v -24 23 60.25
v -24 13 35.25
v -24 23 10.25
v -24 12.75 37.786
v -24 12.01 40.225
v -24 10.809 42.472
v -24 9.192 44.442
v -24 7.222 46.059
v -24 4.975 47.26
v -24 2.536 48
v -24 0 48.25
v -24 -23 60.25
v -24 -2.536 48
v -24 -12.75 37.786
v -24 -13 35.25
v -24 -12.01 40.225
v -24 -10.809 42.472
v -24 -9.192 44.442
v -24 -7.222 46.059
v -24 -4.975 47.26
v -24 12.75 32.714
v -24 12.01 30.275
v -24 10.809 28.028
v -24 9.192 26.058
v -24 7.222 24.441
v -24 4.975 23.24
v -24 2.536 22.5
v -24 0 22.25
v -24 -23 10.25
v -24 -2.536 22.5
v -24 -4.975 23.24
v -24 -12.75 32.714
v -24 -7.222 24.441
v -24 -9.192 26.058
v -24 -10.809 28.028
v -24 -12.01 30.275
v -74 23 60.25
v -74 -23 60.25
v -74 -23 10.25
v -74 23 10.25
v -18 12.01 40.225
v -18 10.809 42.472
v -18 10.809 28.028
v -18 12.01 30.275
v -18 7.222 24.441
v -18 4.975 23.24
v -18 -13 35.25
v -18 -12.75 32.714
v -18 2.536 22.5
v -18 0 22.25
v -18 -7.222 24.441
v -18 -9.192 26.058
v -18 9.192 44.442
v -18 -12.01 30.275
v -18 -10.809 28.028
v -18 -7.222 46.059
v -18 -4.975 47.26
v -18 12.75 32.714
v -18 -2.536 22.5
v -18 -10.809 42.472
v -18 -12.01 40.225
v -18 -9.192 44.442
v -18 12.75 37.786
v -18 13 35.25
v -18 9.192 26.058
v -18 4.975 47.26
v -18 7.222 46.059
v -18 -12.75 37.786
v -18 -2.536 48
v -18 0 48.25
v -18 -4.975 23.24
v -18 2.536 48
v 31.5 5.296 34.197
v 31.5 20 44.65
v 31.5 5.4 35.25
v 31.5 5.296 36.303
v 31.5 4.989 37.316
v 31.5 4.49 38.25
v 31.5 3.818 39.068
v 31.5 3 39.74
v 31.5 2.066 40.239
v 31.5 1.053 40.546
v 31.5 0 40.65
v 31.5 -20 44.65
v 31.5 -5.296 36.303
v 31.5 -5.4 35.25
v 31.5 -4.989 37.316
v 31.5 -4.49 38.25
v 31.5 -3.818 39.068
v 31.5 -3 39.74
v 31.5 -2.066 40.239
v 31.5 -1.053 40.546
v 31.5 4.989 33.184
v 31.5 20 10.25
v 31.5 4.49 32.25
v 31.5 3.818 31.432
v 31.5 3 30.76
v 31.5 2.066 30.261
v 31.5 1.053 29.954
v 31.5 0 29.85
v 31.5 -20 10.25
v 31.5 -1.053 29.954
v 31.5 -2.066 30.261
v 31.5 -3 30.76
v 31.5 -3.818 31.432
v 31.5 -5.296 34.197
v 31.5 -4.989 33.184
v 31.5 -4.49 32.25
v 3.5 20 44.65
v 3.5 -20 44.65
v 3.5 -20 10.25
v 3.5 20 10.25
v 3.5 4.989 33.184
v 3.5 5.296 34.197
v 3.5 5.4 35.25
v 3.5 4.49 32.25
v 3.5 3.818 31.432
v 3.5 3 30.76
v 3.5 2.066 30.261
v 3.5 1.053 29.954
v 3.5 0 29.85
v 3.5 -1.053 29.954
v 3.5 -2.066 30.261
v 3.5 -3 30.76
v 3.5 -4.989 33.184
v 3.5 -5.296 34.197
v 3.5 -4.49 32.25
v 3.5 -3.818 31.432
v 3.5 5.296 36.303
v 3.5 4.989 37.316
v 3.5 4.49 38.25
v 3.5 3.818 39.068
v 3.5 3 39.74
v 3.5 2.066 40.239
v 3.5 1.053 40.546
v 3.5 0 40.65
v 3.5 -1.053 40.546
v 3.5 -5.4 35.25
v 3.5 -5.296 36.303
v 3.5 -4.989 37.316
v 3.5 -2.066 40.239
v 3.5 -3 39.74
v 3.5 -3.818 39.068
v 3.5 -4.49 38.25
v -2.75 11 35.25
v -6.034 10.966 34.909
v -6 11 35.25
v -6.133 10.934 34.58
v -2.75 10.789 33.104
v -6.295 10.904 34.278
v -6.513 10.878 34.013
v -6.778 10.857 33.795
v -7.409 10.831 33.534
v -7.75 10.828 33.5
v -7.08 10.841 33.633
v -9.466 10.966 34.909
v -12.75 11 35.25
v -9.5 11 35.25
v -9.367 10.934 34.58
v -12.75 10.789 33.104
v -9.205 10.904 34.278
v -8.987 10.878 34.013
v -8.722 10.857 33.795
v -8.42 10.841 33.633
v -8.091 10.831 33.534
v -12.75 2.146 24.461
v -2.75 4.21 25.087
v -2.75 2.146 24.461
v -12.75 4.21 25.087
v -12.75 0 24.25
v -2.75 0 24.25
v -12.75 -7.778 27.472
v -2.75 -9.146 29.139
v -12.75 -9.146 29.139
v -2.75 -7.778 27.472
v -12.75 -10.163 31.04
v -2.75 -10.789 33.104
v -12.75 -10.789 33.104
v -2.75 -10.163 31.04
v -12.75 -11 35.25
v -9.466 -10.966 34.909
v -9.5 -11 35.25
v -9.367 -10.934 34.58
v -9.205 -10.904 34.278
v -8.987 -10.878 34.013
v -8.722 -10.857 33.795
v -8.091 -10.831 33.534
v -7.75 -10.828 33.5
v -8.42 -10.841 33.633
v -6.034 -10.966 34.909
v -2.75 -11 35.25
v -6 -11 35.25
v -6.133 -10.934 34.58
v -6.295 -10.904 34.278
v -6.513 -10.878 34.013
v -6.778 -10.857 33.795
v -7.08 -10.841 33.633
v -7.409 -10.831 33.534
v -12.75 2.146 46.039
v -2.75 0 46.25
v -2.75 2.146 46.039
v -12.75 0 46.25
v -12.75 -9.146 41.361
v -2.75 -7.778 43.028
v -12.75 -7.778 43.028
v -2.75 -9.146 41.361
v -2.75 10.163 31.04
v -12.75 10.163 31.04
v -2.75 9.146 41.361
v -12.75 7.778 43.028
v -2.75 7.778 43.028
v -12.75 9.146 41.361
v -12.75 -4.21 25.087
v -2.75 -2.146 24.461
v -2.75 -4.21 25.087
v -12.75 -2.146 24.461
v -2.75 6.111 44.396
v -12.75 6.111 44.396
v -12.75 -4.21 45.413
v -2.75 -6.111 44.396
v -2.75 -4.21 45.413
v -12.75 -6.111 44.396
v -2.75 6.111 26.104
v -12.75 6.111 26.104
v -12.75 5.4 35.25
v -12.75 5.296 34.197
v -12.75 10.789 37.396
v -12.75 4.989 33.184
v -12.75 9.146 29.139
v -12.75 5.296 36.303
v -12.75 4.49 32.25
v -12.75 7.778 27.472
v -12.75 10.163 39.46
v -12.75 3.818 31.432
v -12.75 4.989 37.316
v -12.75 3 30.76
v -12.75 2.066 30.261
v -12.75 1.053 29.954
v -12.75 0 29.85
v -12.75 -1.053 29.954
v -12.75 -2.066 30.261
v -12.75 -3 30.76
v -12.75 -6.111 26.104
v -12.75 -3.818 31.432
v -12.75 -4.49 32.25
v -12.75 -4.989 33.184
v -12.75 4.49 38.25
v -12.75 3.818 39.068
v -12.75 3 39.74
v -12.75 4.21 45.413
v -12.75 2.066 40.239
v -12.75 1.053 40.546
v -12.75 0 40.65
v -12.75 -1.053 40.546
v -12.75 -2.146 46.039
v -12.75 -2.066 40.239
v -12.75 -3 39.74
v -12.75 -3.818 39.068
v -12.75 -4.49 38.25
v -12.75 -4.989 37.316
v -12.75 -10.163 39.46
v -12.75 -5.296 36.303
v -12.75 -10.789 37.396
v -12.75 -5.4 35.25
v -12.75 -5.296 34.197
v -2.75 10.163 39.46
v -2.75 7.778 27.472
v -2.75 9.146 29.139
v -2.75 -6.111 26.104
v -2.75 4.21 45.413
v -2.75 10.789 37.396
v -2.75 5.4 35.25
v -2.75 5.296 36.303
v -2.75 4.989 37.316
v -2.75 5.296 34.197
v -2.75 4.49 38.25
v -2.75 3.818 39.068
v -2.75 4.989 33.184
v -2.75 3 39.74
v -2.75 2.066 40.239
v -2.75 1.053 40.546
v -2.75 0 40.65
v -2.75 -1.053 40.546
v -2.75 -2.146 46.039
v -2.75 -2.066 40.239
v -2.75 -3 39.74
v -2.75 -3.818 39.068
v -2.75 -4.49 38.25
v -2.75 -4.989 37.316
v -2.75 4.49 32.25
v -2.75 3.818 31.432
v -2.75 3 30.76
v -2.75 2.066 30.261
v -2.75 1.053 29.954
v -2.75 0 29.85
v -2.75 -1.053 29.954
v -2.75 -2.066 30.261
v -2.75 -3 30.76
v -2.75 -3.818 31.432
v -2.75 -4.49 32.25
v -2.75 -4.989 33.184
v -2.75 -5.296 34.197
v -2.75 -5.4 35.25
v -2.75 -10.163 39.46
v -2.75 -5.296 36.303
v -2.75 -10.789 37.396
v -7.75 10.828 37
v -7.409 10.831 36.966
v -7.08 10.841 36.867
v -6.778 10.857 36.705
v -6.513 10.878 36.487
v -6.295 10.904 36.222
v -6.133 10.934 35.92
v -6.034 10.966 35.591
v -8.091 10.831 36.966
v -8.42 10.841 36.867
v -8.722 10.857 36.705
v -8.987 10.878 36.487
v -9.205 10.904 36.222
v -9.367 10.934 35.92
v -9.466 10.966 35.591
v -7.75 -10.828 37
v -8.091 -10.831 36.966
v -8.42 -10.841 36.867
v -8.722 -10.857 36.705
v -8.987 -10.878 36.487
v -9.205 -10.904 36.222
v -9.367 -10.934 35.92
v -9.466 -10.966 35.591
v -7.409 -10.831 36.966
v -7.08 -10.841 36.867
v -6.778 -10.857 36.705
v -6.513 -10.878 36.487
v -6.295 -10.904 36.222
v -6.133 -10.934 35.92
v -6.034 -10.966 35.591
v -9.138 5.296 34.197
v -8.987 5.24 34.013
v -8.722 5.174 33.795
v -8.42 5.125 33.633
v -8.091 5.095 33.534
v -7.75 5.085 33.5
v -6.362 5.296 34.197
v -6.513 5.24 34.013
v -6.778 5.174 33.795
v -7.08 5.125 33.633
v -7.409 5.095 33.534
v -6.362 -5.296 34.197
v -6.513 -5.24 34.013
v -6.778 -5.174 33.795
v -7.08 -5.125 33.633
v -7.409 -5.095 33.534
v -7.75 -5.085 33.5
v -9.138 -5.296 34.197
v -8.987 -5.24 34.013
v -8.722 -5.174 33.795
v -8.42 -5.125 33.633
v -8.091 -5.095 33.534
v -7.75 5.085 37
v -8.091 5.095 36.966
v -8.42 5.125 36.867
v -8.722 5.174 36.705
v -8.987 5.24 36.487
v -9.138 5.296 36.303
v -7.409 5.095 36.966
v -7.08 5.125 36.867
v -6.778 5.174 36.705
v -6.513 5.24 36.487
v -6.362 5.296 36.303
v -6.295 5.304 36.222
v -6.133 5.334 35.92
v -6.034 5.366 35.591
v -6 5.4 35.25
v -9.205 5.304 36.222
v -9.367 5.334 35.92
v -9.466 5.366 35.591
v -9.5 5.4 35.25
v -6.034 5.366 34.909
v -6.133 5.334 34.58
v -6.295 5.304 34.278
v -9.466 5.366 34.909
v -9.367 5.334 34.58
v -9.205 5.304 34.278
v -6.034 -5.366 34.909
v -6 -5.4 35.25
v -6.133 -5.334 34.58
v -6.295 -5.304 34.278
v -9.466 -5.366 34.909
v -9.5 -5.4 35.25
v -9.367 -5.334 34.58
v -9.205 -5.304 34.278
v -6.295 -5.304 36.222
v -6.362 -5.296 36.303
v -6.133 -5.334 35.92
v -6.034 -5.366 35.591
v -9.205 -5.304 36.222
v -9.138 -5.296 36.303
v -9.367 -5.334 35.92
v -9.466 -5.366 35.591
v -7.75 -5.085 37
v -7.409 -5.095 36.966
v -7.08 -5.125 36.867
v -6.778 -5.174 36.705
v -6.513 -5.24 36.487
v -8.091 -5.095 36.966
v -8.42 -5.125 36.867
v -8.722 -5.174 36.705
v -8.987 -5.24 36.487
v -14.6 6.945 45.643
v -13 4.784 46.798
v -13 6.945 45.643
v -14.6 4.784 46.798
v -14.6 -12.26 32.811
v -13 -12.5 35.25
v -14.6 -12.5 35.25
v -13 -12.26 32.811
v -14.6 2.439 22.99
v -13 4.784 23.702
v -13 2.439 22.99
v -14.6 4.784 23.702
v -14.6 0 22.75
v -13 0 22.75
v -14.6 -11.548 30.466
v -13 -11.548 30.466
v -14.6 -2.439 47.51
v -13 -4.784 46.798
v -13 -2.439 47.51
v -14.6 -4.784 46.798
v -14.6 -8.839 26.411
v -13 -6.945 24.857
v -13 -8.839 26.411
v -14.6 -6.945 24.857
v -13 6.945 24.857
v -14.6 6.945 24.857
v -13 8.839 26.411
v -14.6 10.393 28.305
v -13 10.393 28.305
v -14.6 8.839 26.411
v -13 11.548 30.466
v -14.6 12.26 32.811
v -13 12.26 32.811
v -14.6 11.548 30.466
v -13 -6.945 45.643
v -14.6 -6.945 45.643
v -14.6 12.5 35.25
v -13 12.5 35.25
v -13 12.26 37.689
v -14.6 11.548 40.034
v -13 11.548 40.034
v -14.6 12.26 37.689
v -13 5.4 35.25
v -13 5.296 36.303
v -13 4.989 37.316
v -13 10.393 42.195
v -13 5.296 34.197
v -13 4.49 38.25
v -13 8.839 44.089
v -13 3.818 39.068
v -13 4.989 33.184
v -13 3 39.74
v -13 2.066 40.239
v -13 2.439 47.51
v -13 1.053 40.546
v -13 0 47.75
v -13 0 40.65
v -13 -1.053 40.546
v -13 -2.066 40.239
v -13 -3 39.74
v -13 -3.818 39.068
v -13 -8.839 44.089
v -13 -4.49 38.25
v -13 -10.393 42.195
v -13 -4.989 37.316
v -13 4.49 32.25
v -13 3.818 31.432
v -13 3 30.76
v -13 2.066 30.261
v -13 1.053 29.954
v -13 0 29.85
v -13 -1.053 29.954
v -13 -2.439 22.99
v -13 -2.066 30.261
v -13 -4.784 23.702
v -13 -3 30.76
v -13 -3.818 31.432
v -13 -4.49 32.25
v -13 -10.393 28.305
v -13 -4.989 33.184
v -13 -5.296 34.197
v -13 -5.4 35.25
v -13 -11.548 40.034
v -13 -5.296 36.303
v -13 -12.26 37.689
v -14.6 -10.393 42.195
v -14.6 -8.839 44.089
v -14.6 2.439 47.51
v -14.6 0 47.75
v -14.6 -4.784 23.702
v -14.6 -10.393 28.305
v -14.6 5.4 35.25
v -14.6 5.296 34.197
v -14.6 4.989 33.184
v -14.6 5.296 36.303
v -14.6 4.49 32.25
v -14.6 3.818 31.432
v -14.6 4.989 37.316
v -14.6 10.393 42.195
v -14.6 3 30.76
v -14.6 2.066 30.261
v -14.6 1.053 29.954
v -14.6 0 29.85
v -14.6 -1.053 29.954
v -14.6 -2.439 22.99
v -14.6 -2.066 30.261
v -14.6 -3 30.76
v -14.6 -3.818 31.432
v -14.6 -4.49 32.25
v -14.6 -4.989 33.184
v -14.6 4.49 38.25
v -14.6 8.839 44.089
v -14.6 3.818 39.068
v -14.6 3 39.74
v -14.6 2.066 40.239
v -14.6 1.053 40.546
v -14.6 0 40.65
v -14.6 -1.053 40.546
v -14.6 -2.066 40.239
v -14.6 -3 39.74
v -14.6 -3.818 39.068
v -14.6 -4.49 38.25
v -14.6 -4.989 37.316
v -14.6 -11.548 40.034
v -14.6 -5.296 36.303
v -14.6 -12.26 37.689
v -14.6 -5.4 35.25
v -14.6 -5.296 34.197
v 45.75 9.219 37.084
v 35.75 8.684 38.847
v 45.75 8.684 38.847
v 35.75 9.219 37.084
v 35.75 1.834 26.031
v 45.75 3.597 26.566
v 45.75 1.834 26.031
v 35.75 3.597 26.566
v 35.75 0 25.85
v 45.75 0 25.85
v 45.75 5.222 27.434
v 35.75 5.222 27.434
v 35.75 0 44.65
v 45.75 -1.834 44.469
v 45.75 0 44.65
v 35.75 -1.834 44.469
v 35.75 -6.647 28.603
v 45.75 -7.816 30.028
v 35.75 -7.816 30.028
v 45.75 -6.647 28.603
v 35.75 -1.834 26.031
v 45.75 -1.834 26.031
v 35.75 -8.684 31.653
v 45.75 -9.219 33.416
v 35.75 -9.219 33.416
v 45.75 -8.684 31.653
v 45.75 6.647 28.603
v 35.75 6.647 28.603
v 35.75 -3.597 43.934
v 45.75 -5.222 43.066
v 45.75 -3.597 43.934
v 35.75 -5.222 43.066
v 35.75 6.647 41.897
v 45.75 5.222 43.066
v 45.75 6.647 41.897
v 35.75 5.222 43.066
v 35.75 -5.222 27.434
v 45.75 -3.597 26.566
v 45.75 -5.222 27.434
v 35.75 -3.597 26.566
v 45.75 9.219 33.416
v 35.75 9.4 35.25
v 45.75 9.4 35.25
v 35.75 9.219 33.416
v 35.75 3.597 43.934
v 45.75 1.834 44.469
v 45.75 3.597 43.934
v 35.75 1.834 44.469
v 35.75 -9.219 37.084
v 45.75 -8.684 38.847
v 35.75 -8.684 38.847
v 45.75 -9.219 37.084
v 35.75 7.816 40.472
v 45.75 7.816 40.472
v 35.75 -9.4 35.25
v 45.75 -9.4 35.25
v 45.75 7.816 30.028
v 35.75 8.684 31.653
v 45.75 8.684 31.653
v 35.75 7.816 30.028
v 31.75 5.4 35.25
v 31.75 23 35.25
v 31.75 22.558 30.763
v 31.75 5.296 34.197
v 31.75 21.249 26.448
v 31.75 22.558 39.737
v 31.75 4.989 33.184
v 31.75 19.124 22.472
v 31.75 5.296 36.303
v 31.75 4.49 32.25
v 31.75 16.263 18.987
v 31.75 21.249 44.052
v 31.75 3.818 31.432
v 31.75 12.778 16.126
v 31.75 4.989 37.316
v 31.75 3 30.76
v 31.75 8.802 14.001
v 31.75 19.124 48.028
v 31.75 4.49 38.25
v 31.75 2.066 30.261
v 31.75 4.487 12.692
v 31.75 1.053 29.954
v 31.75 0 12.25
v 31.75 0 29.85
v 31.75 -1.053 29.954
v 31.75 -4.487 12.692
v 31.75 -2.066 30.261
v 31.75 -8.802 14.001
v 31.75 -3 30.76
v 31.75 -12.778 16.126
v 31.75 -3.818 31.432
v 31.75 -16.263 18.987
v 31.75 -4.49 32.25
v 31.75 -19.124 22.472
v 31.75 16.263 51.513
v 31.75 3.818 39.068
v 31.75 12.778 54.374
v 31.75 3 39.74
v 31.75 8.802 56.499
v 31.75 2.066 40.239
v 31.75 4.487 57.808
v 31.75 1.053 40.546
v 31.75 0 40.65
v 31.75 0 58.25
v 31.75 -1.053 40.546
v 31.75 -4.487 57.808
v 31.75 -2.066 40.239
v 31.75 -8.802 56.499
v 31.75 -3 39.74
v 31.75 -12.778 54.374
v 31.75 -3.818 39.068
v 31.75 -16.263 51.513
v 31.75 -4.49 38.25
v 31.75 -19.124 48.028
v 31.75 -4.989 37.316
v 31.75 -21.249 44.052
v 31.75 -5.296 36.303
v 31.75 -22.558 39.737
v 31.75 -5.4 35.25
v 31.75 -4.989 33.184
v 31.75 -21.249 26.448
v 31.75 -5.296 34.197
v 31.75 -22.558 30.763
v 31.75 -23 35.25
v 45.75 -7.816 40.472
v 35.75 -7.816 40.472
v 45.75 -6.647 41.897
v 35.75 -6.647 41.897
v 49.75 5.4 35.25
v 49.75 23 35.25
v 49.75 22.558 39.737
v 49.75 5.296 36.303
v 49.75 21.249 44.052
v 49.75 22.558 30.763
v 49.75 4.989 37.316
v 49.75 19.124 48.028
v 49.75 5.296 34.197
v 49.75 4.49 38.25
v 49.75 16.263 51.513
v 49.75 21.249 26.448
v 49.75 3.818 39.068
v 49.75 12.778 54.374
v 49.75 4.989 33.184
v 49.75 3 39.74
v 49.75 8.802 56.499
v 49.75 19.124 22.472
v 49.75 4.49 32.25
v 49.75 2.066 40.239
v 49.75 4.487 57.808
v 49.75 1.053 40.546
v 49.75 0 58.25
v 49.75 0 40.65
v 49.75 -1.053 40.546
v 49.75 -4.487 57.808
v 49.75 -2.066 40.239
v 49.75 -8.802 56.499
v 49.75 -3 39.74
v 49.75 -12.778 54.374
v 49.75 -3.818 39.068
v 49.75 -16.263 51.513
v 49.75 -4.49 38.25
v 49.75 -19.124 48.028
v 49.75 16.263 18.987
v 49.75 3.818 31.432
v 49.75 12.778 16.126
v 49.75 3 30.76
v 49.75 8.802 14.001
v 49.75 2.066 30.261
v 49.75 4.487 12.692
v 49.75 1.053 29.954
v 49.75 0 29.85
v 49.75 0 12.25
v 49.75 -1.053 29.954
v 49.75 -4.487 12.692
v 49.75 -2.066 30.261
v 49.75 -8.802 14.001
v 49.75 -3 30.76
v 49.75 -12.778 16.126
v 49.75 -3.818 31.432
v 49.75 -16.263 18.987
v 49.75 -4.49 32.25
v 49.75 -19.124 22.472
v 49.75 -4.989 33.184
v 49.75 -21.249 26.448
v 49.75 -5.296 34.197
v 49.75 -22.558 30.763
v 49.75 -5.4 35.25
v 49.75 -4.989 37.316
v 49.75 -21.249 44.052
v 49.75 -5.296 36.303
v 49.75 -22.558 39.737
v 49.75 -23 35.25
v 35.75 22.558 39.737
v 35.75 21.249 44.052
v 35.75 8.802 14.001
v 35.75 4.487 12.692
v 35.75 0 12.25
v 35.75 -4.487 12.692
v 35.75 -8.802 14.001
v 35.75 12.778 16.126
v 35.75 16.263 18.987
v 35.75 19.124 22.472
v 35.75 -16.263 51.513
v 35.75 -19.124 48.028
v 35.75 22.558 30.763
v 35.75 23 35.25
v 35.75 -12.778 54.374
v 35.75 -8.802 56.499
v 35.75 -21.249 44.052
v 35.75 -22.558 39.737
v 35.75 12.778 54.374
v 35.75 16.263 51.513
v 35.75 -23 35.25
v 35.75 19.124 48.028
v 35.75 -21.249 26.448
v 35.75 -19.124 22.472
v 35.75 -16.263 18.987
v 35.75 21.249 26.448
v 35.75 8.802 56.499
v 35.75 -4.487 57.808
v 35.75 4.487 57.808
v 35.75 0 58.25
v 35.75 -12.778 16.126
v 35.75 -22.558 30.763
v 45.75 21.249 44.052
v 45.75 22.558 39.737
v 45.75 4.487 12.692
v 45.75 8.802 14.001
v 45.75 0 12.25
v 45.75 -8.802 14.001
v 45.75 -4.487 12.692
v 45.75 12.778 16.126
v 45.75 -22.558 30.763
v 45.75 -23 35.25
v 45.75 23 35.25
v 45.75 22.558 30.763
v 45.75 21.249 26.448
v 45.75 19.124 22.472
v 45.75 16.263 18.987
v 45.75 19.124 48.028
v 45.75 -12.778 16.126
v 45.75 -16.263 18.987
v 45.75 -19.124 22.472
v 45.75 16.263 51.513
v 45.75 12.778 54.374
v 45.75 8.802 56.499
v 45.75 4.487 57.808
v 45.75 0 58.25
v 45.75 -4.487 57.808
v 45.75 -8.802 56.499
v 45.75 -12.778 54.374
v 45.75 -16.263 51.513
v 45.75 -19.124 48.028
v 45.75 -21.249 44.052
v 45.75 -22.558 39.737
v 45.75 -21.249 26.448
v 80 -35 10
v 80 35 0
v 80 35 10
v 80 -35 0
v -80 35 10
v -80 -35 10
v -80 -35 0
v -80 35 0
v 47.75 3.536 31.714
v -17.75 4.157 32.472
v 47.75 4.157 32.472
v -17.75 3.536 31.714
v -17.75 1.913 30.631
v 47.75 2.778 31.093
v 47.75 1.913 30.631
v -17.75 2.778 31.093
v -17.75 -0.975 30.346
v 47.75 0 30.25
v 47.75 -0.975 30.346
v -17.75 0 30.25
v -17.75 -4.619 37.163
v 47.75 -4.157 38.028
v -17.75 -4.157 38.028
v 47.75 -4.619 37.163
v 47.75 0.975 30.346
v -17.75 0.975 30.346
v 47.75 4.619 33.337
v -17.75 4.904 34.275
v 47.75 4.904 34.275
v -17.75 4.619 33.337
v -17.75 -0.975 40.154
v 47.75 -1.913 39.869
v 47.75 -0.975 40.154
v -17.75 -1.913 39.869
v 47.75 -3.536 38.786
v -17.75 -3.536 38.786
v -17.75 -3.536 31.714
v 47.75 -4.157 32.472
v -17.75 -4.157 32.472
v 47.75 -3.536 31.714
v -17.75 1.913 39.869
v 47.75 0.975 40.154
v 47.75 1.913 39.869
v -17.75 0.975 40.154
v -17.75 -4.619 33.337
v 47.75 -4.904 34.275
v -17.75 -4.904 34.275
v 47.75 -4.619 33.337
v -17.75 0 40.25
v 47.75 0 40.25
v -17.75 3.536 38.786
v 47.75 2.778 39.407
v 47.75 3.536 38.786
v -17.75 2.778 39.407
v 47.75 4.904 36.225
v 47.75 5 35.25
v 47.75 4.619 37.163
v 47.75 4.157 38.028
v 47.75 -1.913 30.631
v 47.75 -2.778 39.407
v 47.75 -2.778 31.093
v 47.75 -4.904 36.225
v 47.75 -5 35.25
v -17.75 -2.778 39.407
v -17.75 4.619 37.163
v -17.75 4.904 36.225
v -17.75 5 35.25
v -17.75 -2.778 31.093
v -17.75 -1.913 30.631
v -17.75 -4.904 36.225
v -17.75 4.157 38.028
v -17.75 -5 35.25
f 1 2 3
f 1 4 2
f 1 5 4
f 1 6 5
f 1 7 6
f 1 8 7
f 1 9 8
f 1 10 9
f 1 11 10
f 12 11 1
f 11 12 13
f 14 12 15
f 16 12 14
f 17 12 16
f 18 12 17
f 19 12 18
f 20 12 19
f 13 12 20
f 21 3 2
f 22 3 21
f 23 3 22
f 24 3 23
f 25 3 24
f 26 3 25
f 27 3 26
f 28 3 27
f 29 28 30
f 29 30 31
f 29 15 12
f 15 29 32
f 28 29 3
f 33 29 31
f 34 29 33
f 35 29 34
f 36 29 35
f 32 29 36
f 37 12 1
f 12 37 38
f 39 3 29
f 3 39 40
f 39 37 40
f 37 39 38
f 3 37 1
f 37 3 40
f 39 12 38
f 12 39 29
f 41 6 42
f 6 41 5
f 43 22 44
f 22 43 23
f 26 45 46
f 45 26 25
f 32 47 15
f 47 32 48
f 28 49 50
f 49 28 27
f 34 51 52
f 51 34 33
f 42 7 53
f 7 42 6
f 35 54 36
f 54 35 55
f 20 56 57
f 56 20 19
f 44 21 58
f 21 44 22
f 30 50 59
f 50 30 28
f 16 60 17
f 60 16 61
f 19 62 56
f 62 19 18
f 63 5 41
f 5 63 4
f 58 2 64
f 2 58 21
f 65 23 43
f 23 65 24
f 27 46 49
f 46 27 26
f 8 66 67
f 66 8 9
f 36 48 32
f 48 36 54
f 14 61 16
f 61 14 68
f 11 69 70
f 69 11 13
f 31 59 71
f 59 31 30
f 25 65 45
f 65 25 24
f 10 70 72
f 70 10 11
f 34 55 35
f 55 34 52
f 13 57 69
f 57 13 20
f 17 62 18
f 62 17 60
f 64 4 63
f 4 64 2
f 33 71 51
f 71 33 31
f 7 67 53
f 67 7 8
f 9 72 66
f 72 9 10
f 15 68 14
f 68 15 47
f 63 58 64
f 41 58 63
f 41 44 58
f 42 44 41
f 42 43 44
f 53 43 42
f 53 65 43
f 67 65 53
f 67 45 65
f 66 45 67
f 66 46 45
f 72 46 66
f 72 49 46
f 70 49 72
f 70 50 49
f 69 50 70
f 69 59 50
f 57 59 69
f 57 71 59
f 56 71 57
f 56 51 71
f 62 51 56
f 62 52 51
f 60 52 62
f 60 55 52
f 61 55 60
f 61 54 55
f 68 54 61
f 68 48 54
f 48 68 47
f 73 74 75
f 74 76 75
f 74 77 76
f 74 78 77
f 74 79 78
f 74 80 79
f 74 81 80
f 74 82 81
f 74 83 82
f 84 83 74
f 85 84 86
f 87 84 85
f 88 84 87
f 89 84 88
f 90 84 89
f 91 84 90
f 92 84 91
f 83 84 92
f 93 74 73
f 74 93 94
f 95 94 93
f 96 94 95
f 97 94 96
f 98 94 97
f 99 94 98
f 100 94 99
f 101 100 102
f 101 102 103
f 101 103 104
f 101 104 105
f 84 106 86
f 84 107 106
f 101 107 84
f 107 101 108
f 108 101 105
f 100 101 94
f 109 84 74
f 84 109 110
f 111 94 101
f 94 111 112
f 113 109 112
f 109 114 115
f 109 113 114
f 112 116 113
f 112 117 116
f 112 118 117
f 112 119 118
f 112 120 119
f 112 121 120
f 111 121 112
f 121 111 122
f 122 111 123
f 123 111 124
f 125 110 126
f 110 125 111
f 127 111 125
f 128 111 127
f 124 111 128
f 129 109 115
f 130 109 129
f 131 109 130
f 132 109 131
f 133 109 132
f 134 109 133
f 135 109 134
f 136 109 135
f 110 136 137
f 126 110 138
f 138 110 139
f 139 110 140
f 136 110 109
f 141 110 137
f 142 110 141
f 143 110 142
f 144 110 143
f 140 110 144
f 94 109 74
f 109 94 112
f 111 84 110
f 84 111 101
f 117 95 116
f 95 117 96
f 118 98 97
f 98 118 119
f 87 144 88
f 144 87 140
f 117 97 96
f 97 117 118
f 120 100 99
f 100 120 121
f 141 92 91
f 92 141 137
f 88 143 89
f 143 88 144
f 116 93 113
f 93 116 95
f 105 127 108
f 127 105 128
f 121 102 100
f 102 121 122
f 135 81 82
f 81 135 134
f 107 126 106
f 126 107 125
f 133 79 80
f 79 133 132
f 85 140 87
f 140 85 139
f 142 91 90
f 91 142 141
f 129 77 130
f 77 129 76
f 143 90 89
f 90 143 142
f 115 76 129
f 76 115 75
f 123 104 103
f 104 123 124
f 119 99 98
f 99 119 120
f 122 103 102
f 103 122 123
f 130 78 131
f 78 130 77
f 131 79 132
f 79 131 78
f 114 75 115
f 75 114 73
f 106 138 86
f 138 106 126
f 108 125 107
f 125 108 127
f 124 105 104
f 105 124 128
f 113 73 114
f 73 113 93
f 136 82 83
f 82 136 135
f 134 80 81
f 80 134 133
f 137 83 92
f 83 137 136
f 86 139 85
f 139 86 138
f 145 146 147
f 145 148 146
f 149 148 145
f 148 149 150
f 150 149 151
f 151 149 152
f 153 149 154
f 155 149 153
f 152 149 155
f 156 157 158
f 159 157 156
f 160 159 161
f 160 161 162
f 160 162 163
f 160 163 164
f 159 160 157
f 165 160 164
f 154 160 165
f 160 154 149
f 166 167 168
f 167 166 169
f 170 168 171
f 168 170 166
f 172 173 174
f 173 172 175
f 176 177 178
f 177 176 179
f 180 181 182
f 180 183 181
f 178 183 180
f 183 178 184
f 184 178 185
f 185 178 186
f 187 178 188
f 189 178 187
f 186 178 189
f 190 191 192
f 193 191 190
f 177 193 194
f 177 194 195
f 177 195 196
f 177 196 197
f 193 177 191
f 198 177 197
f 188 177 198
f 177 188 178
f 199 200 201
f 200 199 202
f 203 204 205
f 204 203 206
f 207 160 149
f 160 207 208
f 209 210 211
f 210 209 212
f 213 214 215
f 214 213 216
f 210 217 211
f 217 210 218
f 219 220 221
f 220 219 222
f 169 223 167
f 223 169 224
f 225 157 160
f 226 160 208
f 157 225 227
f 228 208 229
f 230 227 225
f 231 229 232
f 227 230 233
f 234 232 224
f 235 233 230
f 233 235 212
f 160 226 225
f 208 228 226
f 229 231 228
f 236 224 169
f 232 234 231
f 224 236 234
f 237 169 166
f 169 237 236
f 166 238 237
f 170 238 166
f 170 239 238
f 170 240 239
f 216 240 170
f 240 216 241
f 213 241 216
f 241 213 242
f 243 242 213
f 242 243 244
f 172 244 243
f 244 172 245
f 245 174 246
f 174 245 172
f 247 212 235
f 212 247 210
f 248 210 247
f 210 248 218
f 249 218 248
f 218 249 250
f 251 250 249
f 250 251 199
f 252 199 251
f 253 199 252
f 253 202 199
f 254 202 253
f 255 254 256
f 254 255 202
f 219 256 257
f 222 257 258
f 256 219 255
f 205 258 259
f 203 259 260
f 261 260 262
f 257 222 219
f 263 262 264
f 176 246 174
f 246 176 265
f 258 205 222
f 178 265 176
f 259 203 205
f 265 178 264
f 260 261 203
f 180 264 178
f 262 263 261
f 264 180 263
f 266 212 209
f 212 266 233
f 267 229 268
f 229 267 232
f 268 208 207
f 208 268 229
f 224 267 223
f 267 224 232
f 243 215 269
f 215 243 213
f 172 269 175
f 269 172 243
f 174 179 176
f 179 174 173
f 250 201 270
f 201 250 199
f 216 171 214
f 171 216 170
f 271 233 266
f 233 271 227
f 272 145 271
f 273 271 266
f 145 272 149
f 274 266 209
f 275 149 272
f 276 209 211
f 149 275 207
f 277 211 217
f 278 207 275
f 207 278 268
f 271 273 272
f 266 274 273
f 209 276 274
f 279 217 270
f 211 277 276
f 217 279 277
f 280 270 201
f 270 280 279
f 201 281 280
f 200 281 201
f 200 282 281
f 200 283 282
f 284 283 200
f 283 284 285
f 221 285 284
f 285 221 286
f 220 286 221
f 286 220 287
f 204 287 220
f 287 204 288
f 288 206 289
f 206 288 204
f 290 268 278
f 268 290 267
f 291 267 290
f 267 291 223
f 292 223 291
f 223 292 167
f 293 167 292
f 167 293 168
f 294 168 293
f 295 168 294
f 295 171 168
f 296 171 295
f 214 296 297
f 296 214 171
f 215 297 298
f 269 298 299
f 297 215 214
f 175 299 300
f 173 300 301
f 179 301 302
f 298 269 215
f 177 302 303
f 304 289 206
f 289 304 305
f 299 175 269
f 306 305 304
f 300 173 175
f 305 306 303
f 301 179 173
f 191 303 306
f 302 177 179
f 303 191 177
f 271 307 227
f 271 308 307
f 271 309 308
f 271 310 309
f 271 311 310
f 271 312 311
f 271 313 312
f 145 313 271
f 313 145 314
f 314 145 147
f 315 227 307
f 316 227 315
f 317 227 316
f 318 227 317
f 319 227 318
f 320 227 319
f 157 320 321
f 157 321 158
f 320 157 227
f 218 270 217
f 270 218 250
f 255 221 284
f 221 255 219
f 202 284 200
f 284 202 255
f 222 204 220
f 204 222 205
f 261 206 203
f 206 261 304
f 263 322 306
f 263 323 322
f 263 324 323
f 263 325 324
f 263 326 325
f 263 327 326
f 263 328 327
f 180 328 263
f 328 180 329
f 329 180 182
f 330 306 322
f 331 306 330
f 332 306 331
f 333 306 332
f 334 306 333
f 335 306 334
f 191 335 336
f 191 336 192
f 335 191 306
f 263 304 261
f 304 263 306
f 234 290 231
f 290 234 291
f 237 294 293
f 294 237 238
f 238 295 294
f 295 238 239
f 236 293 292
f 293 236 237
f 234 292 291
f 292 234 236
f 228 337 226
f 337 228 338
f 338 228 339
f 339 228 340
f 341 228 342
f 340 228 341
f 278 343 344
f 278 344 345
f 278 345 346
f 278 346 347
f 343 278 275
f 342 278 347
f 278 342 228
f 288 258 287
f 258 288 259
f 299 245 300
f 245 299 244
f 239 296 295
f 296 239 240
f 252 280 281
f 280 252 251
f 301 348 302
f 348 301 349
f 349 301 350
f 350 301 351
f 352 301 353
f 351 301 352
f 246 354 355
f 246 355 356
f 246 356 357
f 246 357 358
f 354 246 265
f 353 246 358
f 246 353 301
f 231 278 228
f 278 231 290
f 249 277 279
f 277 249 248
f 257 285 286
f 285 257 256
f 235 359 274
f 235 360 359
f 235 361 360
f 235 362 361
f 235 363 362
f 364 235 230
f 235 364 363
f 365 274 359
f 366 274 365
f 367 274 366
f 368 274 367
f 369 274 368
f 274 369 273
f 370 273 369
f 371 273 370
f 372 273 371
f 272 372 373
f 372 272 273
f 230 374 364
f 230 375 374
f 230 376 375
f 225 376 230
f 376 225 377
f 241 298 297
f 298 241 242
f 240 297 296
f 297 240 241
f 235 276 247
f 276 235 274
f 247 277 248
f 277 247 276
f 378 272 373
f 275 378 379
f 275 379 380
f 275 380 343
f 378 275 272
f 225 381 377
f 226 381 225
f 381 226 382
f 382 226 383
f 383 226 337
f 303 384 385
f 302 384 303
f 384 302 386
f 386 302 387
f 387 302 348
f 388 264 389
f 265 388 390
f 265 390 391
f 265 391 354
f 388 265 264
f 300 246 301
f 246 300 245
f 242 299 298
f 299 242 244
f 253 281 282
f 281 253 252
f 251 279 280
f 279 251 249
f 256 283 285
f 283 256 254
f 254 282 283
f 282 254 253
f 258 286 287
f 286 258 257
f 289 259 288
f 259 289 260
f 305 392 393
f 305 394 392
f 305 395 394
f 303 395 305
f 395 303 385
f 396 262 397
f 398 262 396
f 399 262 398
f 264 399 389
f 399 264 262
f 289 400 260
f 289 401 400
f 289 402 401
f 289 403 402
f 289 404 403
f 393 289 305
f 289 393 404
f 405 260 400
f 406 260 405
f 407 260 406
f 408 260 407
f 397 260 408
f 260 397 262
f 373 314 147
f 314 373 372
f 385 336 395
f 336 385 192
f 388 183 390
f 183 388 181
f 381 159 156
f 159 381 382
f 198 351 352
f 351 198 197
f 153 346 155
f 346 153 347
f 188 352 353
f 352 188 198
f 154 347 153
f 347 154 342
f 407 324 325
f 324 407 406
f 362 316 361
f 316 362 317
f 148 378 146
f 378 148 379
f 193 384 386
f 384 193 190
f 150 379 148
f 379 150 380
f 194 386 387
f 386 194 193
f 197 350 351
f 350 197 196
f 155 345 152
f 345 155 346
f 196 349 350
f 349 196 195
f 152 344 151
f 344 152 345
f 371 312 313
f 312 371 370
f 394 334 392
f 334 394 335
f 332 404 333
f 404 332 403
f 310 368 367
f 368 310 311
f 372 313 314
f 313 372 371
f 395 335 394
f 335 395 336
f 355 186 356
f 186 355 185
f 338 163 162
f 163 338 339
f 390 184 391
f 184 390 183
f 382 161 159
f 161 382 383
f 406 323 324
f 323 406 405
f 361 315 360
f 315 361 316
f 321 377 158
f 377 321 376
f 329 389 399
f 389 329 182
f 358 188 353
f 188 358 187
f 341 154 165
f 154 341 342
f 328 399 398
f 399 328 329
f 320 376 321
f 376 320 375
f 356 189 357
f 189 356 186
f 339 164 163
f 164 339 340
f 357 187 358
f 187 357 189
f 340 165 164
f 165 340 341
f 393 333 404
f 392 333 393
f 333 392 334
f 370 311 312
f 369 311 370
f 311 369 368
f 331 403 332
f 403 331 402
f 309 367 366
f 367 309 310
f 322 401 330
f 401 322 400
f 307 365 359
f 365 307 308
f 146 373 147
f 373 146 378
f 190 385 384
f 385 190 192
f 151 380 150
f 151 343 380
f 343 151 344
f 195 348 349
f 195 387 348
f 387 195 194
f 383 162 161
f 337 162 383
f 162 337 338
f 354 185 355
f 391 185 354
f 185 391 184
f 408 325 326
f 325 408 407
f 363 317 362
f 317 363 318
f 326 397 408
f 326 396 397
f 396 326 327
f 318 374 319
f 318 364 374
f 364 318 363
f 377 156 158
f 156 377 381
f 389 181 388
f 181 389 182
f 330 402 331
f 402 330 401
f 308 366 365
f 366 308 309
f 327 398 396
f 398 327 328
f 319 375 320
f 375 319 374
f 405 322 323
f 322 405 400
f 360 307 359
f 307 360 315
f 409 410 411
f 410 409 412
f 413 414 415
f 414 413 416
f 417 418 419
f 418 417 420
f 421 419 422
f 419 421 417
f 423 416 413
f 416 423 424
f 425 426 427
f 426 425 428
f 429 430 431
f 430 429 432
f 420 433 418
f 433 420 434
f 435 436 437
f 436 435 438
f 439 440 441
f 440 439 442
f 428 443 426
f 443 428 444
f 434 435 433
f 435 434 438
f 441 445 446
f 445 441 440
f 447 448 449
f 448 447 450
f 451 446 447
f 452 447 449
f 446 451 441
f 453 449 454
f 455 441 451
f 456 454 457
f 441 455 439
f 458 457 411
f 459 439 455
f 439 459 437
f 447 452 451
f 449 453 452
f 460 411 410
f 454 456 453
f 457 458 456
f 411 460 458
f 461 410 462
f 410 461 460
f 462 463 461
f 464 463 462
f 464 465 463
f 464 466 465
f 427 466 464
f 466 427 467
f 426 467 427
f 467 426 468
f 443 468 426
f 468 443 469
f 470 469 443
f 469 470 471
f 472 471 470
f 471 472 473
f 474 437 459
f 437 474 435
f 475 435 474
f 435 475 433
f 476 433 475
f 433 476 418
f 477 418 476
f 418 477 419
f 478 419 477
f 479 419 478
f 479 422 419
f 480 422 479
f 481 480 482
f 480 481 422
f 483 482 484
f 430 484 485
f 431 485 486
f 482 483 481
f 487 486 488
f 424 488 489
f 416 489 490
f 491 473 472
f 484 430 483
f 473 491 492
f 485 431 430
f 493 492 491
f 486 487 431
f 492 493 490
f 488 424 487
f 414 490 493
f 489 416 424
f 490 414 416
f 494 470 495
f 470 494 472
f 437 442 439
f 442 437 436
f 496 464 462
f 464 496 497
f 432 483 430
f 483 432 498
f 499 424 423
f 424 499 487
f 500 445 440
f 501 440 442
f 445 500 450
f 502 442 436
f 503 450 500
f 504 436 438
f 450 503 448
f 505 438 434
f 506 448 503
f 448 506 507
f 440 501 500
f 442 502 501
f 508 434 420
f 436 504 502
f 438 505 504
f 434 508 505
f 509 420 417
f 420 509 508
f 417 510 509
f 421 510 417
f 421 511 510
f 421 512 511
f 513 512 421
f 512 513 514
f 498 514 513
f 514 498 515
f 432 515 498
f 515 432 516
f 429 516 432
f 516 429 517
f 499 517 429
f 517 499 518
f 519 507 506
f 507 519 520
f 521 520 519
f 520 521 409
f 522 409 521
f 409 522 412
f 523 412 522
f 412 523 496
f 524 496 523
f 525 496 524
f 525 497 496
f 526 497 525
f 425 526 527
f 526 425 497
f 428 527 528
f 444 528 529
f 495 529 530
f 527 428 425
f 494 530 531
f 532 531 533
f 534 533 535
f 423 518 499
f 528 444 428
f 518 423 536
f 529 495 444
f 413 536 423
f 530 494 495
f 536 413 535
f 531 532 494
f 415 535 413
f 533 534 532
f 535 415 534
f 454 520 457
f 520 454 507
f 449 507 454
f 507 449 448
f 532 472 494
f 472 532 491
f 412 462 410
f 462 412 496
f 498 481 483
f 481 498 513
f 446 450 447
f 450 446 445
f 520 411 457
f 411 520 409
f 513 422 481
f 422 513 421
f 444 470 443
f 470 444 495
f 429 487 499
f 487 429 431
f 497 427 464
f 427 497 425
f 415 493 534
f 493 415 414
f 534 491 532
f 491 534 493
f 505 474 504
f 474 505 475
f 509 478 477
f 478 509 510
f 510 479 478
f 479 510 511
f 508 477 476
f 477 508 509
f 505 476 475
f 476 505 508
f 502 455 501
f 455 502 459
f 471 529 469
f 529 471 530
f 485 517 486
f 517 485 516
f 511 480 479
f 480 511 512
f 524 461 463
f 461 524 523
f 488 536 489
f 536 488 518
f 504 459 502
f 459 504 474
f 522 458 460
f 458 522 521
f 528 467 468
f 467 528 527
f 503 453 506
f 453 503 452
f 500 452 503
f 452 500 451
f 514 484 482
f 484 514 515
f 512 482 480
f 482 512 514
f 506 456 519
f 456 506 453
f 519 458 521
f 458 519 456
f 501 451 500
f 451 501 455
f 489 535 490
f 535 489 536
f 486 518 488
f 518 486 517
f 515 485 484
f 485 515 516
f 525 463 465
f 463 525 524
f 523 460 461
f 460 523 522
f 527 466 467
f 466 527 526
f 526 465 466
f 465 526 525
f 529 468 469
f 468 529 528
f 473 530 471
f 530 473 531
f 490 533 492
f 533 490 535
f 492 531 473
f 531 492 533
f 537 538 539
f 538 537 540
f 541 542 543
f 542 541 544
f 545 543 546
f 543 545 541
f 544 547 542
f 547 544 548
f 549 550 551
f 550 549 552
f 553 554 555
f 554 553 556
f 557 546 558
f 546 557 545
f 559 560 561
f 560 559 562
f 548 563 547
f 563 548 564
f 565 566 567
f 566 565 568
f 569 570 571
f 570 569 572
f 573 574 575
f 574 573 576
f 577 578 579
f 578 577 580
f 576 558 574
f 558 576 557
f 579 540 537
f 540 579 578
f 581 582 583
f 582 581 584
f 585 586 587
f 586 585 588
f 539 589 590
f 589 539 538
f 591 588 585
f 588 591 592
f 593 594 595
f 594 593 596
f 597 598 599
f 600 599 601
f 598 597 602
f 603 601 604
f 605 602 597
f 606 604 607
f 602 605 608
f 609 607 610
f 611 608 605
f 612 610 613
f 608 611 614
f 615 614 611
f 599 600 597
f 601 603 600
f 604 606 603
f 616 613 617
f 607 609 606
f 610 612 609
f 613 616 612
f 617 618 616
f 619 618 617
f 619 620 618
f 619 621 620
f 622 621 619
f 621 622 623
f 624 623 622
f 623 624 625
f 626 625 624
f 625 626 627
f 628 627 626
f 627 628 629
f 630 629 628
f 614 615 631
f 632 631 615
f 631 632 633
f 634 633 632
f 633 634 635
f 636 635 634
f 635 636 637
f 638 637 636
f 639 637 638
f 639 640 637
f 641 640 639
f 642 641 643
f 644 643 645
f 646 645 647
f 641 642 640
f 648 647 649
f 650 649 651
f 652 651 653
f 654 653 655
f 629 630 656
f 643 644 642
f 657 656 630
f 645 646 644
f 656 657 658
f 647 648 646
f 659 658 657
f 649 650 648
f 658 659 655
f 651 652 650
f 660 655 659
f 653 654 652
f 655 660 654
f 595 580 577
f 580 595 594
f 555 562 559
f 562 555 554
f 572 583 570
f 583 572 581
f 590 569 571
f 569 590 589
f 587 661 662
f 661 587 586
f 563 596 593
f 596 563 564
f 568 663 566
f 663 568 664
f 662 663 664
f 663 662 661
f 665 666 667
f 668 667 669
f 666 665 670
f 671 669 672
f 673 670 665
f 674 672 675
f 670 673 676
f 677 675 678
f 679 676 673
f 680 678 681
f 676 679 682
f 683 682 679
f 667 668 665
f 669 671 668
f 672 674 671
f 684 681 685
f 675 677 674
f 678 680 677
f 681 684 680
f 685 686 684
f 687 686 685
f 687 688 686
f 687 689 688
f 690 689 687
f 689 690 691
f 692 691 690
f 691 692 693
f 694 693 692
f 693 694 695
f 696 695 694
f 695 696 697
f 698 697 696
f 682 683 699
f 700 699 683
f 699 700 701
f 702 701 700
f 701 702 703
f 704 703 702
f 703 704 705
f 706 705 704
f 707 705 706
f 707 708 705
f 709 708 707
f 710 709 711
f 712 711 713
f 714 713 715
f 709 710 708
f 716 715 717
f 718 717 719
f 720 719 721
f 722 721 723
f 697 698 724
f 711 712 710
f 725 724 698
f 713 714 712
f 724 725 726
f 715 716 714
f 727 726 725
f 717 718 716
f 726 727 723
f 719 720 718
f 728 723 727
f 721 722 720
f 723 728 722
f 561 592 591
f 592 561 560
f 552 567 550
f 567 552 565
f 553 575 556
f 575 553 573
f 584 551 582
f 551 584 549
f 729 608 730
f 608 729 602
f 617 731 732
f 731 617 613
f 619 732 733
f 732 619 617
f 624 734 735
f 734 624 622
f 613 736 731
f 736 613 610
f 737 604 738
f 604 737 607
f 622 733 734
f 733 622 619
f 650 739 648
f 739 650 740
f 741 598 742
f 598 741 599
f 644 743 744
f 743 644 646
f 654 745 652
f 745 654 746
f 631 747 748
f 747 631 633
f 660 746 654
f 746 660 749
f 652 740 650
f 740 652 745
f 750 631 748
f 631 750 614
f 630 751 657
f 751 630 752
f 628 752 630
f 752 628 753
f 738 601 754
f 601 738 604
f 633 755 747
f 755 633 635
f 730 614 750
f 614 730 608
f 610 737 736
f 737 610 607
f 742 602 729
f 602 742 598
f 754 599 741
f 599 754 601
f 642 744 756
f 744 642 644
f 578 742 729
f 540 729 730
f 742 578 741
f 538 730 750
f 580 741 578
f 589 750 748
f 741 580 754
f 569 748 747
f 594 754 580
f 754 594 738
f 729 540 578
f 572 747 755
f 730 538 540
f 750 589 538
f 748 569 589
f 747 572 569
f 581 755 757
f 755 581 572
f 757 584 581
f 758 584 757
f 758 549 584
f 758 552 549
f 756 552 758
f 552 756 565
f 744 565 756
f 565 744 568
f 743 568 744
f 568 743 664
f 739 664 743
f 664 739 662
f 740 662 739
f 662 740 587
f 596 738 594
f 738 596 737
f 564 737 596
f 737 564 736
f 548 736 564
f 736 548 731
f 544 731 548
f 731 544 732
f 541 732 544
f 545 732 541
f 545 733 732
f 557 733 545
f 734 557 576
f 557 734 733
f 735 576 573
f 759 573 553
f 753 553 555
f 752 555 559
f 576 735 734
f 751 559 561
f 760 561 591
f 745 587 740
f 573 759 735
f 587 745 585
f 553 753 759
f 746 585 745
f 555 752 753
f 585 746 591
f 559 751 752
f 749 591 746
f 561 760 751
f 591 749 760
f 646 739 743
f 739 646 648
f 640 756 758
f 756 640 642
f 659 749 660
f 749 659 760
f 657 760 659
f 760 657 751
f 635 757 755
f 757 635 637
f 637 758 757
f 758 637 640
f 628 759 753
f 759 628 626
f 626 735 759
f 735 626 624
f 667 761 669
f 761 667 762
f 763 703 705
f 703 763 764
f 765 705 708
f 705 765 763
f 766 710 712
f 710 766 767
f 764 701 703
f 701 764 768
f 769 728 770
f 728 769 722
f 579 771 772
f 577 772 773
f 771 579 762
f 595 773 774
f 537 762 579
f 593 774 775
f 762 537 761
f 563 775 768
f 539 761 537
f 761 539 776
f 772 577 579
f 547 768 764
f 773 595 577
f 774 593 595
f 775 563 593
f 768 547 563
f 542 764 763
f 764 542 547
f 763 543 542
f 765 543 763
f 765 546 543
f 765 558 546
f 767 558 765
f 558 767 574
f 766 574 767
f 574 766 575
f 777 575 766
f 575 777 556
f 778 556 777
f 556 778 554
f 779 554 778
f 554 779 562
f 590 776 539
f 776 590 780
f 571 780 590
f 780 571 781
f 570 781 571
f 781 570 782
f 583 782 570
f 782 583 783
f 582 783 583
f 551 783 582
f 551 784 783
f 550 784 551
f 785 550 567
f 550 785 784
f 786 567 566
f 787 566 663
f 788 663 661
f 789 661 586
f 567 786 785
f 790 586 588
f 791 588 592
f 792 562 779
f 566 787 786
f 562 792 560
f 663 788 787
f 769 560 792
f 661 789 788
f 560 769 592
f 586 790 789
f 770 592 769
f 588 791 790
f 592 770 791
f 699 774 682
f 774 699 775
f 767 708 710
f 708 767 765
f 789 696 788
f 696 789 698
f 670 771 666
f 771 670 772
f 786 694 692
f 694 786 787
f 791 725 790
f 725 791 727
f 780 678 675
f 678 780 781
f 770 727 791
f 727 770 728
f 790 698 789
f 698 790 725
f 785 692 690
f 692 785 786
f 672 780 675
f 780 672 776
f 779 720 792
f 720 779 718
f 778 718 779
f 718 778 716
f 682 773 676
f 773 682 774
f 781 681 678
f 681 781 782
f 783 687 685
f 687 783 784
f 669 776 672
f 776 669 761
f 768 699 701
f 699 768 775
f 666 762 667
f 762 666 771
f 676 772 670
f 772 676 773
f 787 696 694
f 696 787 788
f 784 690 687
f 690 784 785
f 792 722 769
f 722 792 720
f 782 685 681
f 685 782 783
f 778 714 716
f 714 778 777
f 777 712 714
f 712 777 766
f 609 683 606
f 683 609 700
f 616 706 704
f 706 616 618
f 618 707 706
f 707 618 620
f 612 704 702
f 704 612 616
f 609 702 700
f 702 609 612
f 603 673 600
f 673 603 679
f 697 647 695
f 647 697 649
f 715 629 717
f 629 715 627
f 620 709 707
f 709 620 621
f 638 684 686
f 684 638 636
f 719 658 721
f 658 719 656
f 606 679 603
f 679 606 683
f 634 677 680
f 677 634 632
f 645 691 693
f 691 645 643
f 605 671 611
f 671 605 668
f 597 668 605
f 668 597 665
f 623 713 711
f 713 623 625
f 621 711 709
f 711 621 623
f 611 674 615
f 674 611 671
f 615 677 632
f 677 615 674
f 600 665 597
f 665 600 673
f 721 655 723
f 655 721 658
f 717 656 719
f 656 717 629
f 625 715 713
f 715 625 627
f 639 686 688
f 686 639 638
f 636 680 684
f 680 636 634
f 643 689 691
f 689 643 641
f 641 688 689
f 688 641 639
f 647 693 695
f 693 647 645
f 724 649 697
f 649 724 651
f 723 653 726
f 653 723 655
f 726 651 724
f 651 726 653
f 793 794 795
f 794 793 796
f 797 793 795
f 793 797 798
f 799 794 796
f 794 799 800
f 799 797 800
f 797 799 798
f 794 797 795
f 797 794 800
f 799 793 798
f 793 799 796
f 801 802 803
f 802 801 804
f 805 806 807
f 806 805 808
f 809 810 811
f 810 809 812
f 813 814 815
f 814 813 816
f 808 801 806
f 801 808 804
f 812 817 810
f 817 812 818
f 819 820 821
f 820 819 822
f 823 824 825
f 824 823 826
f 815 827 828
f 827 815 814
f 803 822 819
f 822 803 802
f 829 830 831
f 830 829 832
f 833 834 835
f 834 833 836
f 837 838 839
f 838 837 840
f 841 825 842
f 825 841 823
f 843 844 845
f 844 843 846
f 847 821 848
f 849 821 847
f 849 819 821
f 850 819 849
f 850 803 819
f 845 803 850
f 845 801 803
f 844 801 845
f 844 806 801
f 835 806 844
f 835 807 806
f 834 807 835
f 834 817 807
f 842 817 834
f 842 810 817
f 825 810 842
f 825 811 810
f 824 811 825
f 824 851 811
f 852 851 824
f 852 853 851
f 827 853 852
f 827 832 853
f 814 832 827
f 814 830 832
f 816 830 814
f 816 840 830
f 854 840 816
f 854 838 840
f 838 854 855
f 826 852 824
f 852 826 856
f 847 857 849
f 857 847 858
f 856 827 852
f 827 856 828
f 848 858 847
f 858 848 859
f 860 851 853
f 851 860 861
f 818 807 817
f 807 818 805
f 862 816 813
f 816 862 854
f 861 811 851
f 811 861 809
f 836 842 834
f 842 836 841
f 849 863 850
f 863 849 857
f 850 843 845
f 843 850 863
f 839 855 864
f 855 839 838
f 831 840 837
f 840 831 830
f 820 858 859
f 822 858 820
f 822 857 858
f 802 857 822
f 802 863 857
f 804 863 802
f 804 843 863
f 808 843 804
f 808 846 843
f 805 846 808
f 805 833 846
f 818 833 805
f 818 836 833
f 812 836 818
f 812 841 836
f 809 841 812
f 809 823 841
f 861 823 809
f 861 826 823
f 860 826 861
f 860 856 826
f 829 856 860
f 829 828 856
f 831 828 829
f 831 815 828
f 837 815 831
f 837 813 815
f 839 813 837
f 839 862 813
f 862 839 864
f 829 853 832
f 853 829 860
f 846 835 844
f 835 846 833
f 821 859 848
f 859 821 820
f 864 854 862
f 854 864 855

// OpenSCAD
$fn = 32;

// ------------------------------------------------------------------------
// Motor drive station: motor 50 x 50 mm, shaft d10, pulley d46
// Every part is its own module, assembly() places every instance.
// ------------------------------------------------------------------------

// --- part 1 ---
module station_bed() {
  difference() {
    translate([-80, -35, 0]) cube([160, 70, 10]);
  }
}

// --- part 2 ---
module drive_motor() {
  union() {
    translate([-25, -23, 0]) cube([50, 46, 50]);
    translate([28, 0, 25]) rotate([0, 90, 0]) cylinder(h = 6, d = 26, center = true);
  }
}

// --- part 3 ---
module pillow_block() {
  difference() {
    translate([-14, -20, 0]) cube([28, 40, 34.4]);
    translate([0, 0, 25]) rotate([0, 90, 0]) cylinder(h = 30, d = 10.8, center = true);
  }
}

// --- part 4 ---
module drive_shaft() {
  translate([0, 0, -32.75]) cylinder(h = 65.5, d = 10);
}

// --- part 5 ---
module shaft_collar() {
  difference() {
    cylinder(h = 10, d = 22);
    translate([0, 0, -1]) cylinder(h = 12, d = 10.8);
    translate([0, 0, 5]) rotate([90, 0, 0]) cylinder(h = 24, d = 3.5, center = true);
  }
}

// --- part 6 ---
module collar_washer() {
  difference() {
      translate([0, 0, 0]) cylinder(h = 1.6, d = 25);
      translate([0, 0, -1]) cylinder(h = 3.6, d = 10.8);
    }
}

// --- part 7 ---
module drive_pulley() {
  difference() {
    union() {
      cylinder(h = 18, d = 18.8);
      cylinder(h = 4, d = 46);
      translate([0, 0, 14]) cylinder(h = 4, d = 46);
    }
    translate([0, 0, -1]) cylinder(h = 20, d = 10.8);
  }
}

// --- assembly ---
module assembly() {
  color([0.80, 0.24, 0.20]) translate([0, 0, 0]) rotate([0, 0, 0]) station_bed();
  color([0.20, 0.45, 0.75]) translate([-49, 0, 10.25]) rotate([0, 0, 0]) drive_motor();
  color([0.25, 0.62, 0.32]) translate([17.5, 0, 10.25]) rotate([0, 0, 0]) pillow_block();
  color([0.92, 0.70, 0.18]) translate([15, 0, 35.25]) rotate([0, 90, 0]) drive_shaft();
  color([0.58, 0.35, 0.70]) translate([-12.75, 0, 35.25]) rotate([0, 90, 0]) shaft_collar();
  color([0.16, 0.66, 0.66]) translate([-14.6, 0, 35.25]) rotate([0, 90, 0]) collar_washer();
  color([0.85, 0.48, 0.18]) translate([31.75, 0, 35.25]) rotate([0, 90, 0]) drive_pulley();
}

assembly();
